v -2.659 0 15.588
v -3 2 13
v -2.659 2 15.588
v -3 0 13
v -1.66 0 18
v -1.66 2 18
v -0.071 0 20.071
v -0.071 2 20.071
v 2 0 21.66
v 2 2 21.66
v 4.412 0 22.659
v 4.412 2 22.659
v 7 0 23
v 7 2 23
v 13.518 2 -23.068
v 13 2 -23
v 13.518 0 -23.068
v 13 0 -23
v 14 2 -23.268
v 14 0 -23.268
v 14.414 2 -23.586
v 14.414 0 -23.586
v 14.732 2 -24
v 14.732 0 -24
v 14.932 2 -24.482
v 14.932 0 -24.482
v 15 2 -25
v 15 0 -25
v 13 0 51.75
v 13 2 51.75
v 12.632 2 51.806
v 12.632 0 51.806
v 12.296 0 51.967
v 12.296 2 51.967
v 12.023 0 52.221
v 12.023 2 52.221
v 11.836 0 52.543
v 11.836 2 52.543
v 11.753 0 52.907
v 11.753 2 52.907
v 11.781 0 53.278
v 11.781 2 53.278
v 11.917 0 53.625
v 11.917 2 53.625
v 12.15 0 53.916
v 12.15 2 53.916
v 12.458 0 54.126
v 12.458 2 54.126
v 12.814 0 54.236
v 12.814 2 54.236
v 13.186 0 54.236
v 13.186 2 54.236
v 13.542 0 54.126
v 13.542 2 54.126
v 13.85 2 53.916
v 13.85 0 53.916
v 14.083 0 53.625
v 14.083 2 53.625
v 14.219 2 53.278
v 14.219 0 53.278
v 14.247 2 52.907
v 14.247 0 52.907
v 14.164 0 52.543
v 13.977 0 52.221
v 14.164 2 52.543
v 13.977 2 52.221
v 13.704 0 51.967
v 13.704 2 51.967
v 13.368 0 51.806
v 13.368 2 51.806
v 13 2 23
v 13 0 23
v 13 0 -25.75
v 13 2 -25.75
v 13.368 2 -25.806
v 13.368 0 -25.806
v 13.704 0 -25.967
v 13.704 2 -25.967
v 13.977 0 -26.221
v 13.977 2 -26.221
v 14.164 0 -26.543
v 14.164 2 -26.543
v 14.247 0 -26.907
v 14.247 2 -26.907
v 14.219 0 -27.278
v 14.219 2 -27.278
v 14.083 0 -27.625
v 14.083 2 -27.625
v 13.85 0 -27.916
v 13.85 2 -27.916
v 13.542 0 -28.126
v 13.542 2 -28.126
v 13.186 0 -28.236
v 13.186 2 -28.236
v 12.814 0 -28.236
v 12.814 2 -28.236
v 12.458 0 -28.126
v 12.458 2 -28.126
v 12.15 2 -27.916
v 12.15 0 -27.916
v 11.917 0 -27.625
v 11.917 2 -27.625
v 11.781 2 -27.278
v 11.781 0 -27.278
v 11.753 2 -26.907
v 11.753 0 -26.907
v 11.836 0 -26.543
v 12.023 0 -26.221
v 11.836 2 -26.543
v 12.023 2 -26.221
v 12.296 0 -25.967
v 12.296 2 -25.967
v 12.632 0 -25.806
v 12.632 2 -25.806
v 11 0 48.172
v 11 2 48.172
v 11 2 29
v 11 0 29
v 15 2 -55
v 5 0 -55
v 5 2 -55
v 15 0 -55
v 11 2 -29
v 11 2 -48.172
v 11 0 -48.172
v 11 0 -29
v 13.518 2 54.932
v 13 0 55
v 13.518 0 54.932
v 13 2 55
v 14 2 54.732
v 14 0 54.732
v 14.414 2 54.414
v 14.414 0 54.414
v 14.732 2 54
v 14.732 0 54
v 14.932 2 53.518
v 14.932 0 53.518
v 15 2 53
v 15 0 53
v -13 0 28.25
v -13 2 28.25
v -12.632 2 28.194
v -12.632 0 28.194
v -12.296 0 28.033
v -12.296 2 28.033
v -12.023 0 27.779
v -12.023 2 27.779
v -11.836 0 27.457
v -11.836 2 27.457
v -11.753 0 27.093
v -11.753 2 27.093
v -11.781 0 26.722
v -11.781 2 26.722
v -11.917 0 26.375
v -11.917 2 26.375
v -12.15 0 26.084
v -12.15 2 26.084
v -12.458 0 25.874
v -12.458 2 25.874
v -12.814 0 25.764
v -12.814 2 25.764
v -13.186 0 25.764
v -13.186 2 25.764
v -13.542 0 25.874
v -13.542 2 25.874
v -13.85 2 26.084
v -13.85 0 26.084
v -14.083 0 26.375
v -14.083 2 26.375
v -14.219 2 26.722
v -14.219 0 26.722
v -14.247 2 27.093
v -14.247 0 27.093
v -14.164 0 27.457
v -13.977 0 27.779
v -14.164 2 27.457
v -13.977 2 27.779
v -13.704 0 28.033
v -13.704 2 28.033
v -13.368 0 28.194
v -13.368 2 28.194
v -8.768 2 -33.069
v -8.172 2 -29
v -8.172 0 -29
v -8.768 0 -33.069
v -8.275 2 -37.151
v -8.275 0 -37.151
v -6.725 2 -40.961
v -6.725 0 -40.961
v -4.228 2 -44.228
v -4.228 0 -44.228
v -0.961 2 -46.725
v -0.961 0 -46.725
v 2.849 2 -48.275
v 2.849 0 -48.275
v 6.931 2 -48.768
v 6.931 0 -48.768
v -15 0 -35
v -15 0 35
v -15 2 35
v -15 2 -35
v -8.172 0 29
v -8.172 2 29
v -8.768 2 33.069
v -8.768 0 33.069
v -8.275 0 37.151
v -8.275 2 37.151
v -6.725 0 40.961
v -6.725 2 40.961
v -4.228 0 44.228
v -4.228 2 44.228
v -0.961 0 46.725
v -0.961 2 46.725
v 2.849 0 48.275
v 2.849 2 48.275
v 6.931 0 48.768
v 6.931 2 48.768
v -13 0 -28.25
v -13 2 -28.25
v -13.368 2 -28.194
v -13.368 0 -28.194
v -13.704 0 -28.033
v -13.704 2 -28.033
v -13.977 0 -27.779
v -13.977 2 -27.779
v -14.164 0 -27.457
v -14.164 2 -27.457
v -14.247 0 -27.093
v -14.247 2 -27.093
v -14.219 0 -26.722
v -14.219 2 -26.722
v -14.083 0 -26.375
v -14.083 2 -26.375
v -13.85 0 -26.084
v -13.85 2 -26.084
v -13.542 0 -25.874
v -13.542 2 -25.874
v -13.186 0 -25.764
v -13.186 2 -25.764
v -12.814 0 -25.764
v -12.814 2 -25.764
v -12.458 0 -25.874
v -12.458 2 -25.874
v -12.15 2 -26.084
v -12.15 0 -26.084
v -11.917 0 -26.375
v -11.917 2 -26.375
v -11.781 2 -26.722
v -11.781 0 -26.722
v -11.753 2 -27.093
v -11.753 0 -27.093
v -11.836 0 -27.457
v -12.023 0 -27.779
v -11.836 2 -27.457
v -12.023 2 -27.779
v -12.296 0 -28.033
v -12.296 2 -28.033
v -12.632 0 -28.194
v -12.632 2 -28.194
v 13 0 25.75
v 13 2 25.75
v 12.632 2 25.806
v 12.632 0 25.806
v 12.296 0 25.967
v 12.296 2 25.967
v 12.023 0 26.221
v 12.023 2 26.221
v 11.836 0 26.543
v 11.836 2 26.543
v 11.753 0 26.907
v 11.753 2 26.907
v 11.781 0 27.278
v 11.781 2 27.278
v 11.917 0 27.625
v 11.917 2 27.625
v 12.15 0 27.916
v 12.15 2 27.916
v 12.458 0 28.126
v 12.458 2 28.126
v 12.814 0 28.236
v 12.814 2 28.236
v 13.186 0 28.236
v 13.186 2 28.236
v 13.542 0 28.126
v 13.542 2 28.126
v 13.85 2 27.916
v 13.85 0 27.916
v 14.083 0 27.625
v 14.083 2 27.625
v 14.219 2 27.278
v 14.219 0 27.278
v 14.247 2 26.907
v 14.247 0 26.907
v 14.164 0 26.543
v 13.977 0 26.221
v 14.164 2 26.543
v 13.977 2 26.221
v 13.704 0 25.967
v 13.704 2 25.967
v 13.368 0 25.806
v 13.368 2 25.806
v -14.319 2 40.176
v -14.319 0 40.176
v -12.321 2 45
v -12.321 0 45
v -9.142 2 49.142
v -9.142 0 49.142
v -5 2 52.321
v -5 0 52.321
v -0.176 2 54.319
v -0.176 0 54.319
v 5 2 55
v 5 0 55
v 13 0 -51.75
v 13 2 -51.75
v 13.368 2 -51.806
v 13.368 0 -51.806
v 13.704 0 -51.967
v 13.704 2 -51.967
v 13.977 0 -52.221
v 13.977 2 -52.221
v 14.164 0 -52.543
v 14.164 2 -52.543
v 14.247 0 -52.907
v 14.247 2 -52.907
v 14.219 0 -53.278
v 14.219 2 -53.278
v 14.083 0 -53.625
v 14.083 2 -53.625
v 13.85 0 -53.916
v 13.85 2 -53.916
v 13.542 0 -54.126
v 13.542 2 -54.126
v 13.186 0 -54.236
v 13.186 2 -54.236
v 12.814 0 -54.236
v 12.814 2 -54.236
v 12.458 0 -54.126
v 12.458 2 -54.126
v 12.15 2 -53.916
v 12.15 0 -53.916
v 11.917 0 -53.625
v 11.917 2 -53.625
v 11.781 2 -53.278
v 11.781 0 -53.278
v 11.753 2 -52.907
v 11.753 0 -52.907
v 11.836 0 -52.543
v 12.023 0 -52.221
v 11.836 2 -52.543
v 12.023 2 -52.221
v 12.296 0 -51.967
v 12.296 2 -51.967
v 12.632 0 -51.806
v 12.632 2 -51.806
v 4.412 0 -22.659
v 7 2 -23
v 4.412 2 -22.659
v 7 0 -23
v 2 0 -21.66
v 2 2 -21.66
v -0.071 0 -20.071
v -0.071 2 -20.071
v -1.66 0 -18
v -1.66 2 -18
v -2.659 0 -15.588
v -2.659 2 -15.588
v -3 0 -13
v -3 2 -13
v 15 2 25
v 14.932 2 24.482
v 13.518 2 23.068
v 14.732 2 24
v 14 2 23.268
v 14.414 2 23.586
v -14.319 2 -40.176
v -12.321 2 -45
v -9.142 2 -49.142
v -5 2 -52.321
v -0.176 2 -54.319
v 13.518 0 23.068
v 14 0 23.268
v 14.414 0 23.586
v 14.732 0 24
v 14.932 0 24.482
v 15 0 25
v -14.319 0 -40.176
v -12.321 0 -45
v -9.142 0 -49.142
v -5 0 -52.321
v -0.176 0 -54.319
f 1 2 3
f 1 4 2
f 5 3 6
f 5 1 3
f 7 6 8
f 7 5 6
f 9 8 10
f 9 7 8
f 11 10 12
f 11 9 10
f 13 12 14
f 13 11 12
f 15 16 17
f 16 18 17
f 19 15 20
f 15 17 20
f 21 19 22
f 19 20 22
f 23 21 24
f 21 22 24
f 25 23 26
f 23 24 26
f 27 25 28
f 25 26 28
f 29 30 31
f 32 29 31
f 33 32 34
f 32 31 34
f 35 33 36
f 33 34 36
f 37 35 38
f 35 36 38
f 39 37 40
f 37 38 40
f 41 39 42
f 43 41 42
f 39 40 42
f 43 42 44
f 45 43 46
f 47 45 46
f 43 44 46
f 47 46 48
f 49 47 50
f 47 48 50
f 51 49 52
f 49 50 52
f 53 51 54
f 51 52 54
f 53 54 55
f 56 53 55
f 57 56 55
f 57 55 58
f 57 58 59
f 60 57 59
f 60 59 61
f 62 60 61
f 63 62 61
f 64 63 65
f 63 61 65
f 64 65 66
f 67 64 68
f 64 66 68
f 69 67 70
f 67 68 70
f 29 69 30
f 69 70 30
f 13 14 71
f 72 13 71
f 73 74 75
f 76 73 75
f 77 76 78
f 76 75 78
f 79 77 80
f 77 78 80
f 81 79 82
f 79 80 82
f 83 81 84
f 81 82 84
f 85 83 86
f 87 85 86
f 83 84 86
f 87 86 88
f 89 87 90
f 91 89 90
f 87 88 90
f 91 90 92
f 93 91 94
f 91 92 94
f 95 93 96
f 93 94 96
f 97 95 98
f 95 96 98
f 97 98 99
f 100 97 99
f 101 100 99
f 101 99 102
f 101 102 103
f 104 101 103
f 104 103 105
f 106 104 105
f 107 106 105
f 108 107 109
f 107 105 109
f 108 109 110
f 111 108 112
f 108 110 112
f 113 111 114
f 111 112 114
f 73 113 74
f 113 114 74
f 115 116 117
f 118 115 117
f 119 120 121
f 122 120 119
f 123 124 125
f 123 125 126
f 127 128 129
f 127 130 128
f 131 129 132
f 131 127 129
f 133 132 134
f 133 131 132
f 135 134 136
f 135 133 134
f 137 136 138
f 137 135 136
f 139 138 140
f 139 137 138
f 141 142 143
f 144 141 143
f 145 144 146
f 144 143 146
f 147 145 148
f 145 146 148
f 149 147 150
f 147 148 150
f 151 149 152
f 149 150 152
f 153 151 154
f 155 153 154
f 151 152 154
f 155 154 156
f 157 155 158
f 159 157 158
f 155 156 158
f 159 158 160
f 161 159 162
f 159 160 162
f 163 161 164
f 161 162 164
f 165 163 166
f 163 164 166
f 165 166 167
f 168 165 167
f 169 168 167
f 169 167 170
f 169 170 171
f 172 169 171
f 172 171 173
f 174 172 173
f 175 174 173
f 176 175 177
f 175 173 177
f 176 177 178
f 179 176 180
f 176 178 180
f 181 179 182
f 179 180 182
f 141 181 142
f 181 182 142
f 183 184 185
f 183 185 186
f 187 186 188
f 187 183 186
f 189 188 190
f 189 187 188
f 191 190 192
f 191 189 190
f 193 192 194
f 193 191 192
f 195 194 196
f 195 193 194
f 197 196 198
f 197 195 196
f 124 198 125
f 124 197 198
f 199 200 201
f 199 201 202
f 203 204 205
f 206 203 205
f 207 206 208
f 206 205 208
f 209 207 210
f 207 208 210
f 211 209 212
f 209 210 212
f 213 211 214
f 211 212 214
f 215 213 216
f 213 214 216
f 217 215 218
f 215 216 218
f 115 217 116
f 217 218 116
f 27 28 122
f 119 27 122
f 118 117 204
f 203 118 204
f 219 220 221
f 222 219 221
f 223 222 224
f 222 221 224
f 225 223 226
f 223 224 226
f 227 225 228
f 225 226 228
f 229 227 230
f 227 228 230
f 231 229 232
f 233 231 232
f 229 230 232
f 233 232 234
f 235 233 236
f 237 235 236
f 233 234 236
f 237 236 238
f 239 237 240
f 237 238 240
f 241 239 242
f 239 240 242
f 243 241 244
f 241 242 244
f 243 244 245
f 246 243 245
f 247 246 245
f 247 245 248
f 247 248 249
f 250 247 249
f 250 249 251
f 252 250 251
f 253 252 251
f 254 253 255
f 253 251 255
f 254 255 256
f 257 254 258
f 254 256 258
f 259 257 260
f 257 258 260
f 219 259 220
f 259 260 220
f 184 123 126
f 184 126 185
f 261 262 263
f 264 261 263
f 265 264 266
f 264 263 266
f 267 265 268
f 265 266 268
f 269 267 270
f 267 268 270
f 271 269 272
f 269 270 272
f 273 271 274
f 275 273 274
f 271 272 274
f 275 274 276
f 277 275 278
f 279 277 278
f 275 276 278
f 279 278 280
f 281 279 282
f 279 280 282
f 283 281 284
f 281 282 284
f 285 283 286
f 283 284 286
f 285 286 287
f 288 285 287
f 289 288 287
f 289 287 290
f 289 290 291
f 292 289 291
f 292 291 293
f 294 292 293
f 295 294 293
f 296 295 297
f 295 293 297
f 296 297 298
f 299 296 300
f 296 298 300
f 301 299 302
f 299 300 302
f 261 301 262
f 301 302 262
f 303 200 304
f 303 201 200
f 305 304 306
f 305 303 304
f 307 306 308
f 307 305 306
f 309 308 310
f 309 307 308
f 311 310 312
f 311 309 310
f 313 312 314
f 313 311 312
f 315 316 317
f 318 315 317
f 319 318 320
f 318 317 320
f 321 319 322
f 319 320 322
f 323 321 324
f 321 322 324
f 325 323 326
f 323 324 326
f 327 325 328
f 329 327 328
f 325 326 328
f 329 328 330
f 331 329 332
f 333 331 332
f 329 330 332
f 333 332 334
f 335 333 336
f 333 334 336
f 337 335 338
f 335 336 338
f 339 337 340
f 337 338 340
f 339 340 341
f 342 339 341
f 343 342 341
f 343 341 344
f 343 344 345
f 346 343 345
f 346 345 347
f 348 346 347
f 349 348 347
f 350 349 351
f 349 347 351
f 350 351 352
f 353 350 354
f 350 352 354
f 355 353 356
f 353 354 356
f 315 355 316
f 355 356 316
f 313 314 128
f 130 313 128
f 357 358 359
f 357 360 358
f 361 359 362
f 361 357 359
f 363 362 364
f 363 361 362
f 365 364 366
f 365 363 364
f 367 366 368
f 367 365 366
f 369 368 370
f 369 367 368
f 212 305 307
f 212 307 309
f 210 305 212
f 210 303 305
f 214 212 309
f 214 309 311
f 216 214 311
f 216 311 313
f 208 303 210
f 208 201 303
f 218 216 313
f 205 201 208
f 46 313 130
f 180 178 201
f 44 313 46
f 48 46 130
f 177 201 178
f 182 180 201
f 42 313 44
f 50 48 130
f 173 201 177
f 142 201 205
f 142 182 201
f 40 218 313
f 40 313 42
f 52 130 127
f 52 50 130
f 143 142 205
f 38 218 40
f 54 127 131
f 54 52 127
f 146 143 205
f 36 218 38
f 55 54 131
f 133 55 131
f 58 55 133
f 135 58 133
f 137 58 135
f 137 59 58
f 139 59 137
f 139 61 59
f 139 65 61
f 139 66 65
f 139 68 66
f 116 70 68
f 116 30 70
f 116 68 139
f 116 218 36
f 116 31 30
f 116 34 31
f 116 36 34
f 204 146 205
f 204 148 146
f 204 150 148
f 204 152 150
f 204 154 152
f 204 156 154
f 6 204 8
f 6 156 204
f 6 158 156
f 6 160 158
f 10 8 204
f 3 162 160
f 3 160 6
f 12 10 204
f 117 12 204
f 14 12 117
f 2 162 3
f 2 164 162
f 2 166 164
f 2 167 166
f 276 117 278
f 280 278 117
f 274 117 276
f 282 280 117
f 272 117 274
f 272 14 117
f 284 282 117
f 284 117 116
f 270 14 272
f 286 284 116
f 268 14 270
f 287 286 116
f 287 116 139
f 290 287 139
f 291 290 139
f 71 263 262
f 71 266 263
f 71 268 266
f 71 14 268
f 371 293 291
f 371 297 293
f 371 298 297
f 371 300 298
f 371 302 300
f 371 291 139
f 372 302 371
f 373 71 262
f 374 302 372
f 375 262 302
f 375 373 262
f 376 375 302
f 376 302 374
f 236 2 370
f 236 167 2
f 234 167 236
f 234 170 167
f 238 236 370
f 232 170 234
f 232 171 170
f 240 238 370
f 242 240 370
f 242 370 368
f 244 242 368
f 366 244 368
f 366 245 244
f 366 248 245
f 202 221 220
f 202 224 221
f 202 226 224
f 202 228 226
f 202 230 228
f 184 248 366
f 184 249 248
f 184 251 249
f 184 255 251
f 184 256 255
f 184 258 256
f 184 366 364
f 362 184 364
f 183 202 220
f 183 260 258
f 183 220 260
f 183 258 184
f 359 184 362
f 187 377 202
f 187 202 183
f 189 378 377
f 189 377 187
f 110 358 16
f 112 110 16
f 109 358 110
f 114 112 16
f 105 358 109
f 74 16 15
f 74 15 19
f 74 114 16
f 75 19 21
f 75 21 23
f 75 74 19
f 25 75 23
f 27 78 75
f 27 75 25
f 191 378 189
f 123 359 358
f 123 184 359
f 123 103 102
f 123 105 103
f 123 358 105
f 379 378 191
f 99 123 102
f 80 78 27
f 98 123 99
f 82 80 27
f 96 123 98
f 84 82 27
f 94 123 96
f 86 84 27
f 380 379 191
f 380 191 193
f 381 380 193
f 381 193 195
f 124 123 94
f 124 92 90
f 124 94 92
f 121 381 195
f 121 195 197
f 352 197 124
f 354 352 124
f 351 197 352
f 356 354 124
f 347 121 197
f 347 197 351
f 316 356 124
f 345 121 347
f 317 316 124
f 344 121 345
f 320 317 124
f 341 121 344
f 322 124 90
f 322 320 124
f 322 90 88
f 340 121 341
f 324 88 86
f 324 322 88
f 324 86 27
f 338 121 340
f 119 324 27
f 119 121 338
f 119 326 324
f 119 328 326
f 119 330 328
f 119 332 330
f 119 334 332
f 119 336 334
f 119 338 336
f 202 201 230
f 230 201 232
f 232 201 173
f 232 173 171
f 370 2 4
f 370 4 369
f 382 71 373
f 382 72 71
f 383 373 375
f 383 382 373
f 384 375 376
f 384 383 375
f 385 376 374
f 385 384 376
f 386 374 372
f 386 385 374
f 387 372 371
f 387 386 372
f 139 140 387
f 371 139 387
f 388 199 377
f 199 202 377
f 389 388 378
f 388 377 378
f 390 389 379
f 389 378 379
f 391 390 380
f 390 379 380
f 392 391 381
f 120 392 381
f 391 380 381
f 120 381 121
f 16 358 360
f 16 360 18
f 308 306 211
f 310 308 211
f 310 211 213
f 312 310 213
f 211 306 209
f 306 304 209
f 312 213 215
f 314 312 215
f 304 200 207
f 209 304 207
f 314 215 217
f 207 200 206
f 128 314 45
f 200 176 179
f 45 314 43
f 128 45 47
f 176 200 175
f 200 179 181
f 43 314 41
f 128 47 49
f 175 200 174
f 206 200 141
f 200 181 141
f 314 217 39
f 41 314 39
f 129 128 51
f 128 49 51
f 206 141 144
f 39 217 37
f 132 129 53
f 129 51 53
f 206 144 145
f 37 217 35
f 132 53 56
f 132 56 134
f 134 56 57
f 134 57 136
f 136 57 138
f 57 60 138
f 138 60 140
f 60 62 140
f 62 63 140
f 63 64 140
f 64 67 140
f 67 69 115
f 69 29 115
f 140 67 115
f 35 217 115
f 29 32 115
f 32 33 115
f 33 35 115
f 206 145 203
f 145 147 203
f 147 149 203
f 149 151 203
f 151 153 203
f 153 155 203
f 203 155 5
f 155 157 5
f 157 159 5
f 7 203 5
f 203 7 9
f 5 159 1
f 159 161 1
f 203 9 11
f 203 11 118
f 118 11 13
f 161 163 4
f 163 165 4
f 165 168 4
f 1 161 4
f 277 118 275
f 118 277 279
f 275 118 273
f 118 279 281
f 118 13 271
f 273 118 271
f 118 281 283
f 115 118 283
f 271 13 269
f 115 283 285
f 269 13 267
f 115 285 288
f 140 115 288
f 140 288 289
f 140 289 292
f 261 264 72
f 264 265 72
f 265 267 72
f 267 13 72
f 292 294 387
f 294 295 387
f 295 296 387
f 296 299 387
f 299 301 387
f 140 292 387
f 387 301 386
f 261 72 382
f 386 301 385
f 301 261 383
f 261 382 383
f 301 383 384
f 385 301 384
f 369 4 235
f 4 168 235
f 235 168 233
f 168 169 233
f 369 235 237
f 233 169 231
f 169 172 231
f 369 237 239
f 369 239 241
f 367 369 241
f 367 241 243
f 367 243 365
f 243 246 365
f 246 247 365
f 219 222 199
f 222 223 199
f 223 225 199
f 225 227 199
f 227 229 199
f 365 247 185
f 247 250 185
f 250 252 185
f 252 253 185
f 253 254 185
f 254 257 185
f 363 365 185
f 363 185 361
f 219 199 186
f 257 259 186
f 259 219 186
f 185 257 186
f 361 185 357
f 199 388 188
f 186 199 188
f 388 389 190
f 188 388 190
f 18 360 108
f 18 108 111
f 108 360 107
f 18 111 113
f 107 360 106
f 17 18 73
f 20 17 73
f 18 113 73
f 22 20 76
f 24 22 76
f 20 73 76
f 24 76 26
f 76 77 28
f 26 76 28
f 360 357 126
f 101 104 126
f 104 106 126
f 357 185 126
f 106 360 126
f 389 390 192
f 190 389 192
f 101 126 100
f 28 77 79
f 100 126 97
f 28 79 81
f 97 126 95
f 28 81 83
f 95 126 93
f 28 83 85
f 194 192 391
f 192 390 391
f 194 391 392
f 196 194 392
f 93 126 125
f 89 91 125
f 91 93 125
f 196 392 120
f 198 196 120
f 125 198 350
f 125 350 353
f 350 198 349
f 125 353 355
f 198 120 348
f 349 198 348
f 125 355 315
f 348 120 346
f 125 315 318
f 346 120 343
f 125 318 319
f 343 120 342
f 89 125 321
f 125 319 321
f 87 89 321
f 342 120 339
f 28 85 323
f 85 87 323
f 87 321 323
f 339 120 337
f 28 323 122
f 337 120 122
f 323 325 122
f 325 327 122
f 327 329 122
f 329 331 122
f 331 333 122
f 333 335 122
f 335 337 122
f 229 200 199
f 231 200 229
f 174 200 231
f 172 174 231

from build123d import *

# Parameters (mm, degrees)
SKETCH_1_W          = 30
SKETCH_1_H          = 110
EXTRUDE_1_DEPTH     = 2
SKETCH_2_R          = 1.25
CUT_EXTRUDE_1_DEPTH = 2
FILLET_1_R          = 20
FILLET_2_R          = 2
SKETCH_3_W          = 18
SKETCH_3_H          = 46
CUT_EXTRUDE_2_DEPTH = 2
FILLET_4_R          = 10
FILLET_5_R          = 2
CUT_EXTRUDE_3_DEPTH = 10


with BuildPart() as part:
    # 草图1 → 凸台-拉伸1 (new body)
    with BuildSketch(Plane(origin=(0, 0, 0), x_dir=(1, 0, 0), z_dir=(0, 1, 0))):
        Rectangle(SKETCH_1_W, SKETCH_1_H)
    extrude(amount=EXTRUDE_1_DEPTH)

    # 草图2 → 切除-拉伸1 (cut)
    with BuildSketch(Plane(origin=(0, 2, 0), x_dir=(1, 0, 0), z_dir=(0, 1, 0))):
        with Locations(Location((13, 27, 0), (0, 0, 270))):
            Circle(SKETCH_2_R)
        with Locations(Location((-13, 27, 0), (0, 0, 90))):
            Circle(SKETCH_2_R)
        with Locations(Location((13, 53, 0), (0, 0, 270))):
            Circle(SKETCH_2_R)
        with Locations(Location((13, -53, 0), (0, 0, 90))):
            Circle(SKETCH_2_R)
        with Locations(Location((-13, -27, 0), (0, 0, 270))):
            Circle(SKETCH_2_R)
        with Locations(Location((13, -27, 0), (0, 0, 90))):
            Circle(SKETCH_2_R)
    extrude(amount=-CUT_EXTRUDE_1_DEPTH, mode=Mode.SUBTRACT)

    # 圆角1
    fillet_1_edges = [part.edges().sort_by_distance(p)[0] for p in [
        (-15, 1, 55),
        (-15, 1, -55),
    ]]
    fillet(fillet_1_edges, radius=FILLET_1_R)

    # 圆角2
    fillet_2_edges = [part.edges().sort_by_distance(p)[0] for p in [
        (15, 1, 55),
    ]]
    fillet(fillet_2_edges, radius=FILLET_2_R)

    # 草图3 → 切除-拉伸2 (cut)
    with BuildSketch(Plane(origin=(0, 2, 0), x_dir=(1, 0, 0), z_dir=(0, 1, 0))):
        with Locations((6, 0)):
            Rectangle(SKETCH_3_W, SKETCH_3_H)
    extrude(amount=-CUT_EXTRUDE_2_DEPTH, mode=Mode.SUBTRACT)

    # 圆角4
    fillet_4_edges = [part.edges().sort_by_distance(p)[0] for p in [
        (-3, 1, -23),
        (-3, 1, 23),
    ]]
    fillet(fillet_4_edges, radius=FILLET_4_R)

    # 圆角5
    fillet_5_edges = [part.edges().sort_by_distance(p)[0] for p in [
        (15, 1, -23),
        (15, 1, 23),
    ]]
    fillet(fillet_5_edges, radius=FILLET_5_R)

    # 草图4 → 切除-拉伸3 (cut)
    with BuildSketch(Plane(origin=(0, 2, 0), x_dir=(1, 0, 0), z_dir=(0, 1, 0))):
        with BuildLine():
            Line((11, 48.171572875), (11, 29))
            Line((11, 29), (-8.171572875, 29))
            ThreePointArc((-8.171572875, 29), (-4.228384219, 44.228384219), (11, 48.171572875))
        make_face()
        with BuildLine():
            Line((11, -29), (-8.171572875, -29))
            ThreePointArc((-8.171572875, -29), (-4.228384219, -44.228384219), (11, -48.171572875))
            Line((11, -48.171572875), (11, -29))
        make_face()
    extrude(amount=-CUT_EXTRUDE_3_DEPTH, mode=Mode.SUBTRACT)


solid = part.part
